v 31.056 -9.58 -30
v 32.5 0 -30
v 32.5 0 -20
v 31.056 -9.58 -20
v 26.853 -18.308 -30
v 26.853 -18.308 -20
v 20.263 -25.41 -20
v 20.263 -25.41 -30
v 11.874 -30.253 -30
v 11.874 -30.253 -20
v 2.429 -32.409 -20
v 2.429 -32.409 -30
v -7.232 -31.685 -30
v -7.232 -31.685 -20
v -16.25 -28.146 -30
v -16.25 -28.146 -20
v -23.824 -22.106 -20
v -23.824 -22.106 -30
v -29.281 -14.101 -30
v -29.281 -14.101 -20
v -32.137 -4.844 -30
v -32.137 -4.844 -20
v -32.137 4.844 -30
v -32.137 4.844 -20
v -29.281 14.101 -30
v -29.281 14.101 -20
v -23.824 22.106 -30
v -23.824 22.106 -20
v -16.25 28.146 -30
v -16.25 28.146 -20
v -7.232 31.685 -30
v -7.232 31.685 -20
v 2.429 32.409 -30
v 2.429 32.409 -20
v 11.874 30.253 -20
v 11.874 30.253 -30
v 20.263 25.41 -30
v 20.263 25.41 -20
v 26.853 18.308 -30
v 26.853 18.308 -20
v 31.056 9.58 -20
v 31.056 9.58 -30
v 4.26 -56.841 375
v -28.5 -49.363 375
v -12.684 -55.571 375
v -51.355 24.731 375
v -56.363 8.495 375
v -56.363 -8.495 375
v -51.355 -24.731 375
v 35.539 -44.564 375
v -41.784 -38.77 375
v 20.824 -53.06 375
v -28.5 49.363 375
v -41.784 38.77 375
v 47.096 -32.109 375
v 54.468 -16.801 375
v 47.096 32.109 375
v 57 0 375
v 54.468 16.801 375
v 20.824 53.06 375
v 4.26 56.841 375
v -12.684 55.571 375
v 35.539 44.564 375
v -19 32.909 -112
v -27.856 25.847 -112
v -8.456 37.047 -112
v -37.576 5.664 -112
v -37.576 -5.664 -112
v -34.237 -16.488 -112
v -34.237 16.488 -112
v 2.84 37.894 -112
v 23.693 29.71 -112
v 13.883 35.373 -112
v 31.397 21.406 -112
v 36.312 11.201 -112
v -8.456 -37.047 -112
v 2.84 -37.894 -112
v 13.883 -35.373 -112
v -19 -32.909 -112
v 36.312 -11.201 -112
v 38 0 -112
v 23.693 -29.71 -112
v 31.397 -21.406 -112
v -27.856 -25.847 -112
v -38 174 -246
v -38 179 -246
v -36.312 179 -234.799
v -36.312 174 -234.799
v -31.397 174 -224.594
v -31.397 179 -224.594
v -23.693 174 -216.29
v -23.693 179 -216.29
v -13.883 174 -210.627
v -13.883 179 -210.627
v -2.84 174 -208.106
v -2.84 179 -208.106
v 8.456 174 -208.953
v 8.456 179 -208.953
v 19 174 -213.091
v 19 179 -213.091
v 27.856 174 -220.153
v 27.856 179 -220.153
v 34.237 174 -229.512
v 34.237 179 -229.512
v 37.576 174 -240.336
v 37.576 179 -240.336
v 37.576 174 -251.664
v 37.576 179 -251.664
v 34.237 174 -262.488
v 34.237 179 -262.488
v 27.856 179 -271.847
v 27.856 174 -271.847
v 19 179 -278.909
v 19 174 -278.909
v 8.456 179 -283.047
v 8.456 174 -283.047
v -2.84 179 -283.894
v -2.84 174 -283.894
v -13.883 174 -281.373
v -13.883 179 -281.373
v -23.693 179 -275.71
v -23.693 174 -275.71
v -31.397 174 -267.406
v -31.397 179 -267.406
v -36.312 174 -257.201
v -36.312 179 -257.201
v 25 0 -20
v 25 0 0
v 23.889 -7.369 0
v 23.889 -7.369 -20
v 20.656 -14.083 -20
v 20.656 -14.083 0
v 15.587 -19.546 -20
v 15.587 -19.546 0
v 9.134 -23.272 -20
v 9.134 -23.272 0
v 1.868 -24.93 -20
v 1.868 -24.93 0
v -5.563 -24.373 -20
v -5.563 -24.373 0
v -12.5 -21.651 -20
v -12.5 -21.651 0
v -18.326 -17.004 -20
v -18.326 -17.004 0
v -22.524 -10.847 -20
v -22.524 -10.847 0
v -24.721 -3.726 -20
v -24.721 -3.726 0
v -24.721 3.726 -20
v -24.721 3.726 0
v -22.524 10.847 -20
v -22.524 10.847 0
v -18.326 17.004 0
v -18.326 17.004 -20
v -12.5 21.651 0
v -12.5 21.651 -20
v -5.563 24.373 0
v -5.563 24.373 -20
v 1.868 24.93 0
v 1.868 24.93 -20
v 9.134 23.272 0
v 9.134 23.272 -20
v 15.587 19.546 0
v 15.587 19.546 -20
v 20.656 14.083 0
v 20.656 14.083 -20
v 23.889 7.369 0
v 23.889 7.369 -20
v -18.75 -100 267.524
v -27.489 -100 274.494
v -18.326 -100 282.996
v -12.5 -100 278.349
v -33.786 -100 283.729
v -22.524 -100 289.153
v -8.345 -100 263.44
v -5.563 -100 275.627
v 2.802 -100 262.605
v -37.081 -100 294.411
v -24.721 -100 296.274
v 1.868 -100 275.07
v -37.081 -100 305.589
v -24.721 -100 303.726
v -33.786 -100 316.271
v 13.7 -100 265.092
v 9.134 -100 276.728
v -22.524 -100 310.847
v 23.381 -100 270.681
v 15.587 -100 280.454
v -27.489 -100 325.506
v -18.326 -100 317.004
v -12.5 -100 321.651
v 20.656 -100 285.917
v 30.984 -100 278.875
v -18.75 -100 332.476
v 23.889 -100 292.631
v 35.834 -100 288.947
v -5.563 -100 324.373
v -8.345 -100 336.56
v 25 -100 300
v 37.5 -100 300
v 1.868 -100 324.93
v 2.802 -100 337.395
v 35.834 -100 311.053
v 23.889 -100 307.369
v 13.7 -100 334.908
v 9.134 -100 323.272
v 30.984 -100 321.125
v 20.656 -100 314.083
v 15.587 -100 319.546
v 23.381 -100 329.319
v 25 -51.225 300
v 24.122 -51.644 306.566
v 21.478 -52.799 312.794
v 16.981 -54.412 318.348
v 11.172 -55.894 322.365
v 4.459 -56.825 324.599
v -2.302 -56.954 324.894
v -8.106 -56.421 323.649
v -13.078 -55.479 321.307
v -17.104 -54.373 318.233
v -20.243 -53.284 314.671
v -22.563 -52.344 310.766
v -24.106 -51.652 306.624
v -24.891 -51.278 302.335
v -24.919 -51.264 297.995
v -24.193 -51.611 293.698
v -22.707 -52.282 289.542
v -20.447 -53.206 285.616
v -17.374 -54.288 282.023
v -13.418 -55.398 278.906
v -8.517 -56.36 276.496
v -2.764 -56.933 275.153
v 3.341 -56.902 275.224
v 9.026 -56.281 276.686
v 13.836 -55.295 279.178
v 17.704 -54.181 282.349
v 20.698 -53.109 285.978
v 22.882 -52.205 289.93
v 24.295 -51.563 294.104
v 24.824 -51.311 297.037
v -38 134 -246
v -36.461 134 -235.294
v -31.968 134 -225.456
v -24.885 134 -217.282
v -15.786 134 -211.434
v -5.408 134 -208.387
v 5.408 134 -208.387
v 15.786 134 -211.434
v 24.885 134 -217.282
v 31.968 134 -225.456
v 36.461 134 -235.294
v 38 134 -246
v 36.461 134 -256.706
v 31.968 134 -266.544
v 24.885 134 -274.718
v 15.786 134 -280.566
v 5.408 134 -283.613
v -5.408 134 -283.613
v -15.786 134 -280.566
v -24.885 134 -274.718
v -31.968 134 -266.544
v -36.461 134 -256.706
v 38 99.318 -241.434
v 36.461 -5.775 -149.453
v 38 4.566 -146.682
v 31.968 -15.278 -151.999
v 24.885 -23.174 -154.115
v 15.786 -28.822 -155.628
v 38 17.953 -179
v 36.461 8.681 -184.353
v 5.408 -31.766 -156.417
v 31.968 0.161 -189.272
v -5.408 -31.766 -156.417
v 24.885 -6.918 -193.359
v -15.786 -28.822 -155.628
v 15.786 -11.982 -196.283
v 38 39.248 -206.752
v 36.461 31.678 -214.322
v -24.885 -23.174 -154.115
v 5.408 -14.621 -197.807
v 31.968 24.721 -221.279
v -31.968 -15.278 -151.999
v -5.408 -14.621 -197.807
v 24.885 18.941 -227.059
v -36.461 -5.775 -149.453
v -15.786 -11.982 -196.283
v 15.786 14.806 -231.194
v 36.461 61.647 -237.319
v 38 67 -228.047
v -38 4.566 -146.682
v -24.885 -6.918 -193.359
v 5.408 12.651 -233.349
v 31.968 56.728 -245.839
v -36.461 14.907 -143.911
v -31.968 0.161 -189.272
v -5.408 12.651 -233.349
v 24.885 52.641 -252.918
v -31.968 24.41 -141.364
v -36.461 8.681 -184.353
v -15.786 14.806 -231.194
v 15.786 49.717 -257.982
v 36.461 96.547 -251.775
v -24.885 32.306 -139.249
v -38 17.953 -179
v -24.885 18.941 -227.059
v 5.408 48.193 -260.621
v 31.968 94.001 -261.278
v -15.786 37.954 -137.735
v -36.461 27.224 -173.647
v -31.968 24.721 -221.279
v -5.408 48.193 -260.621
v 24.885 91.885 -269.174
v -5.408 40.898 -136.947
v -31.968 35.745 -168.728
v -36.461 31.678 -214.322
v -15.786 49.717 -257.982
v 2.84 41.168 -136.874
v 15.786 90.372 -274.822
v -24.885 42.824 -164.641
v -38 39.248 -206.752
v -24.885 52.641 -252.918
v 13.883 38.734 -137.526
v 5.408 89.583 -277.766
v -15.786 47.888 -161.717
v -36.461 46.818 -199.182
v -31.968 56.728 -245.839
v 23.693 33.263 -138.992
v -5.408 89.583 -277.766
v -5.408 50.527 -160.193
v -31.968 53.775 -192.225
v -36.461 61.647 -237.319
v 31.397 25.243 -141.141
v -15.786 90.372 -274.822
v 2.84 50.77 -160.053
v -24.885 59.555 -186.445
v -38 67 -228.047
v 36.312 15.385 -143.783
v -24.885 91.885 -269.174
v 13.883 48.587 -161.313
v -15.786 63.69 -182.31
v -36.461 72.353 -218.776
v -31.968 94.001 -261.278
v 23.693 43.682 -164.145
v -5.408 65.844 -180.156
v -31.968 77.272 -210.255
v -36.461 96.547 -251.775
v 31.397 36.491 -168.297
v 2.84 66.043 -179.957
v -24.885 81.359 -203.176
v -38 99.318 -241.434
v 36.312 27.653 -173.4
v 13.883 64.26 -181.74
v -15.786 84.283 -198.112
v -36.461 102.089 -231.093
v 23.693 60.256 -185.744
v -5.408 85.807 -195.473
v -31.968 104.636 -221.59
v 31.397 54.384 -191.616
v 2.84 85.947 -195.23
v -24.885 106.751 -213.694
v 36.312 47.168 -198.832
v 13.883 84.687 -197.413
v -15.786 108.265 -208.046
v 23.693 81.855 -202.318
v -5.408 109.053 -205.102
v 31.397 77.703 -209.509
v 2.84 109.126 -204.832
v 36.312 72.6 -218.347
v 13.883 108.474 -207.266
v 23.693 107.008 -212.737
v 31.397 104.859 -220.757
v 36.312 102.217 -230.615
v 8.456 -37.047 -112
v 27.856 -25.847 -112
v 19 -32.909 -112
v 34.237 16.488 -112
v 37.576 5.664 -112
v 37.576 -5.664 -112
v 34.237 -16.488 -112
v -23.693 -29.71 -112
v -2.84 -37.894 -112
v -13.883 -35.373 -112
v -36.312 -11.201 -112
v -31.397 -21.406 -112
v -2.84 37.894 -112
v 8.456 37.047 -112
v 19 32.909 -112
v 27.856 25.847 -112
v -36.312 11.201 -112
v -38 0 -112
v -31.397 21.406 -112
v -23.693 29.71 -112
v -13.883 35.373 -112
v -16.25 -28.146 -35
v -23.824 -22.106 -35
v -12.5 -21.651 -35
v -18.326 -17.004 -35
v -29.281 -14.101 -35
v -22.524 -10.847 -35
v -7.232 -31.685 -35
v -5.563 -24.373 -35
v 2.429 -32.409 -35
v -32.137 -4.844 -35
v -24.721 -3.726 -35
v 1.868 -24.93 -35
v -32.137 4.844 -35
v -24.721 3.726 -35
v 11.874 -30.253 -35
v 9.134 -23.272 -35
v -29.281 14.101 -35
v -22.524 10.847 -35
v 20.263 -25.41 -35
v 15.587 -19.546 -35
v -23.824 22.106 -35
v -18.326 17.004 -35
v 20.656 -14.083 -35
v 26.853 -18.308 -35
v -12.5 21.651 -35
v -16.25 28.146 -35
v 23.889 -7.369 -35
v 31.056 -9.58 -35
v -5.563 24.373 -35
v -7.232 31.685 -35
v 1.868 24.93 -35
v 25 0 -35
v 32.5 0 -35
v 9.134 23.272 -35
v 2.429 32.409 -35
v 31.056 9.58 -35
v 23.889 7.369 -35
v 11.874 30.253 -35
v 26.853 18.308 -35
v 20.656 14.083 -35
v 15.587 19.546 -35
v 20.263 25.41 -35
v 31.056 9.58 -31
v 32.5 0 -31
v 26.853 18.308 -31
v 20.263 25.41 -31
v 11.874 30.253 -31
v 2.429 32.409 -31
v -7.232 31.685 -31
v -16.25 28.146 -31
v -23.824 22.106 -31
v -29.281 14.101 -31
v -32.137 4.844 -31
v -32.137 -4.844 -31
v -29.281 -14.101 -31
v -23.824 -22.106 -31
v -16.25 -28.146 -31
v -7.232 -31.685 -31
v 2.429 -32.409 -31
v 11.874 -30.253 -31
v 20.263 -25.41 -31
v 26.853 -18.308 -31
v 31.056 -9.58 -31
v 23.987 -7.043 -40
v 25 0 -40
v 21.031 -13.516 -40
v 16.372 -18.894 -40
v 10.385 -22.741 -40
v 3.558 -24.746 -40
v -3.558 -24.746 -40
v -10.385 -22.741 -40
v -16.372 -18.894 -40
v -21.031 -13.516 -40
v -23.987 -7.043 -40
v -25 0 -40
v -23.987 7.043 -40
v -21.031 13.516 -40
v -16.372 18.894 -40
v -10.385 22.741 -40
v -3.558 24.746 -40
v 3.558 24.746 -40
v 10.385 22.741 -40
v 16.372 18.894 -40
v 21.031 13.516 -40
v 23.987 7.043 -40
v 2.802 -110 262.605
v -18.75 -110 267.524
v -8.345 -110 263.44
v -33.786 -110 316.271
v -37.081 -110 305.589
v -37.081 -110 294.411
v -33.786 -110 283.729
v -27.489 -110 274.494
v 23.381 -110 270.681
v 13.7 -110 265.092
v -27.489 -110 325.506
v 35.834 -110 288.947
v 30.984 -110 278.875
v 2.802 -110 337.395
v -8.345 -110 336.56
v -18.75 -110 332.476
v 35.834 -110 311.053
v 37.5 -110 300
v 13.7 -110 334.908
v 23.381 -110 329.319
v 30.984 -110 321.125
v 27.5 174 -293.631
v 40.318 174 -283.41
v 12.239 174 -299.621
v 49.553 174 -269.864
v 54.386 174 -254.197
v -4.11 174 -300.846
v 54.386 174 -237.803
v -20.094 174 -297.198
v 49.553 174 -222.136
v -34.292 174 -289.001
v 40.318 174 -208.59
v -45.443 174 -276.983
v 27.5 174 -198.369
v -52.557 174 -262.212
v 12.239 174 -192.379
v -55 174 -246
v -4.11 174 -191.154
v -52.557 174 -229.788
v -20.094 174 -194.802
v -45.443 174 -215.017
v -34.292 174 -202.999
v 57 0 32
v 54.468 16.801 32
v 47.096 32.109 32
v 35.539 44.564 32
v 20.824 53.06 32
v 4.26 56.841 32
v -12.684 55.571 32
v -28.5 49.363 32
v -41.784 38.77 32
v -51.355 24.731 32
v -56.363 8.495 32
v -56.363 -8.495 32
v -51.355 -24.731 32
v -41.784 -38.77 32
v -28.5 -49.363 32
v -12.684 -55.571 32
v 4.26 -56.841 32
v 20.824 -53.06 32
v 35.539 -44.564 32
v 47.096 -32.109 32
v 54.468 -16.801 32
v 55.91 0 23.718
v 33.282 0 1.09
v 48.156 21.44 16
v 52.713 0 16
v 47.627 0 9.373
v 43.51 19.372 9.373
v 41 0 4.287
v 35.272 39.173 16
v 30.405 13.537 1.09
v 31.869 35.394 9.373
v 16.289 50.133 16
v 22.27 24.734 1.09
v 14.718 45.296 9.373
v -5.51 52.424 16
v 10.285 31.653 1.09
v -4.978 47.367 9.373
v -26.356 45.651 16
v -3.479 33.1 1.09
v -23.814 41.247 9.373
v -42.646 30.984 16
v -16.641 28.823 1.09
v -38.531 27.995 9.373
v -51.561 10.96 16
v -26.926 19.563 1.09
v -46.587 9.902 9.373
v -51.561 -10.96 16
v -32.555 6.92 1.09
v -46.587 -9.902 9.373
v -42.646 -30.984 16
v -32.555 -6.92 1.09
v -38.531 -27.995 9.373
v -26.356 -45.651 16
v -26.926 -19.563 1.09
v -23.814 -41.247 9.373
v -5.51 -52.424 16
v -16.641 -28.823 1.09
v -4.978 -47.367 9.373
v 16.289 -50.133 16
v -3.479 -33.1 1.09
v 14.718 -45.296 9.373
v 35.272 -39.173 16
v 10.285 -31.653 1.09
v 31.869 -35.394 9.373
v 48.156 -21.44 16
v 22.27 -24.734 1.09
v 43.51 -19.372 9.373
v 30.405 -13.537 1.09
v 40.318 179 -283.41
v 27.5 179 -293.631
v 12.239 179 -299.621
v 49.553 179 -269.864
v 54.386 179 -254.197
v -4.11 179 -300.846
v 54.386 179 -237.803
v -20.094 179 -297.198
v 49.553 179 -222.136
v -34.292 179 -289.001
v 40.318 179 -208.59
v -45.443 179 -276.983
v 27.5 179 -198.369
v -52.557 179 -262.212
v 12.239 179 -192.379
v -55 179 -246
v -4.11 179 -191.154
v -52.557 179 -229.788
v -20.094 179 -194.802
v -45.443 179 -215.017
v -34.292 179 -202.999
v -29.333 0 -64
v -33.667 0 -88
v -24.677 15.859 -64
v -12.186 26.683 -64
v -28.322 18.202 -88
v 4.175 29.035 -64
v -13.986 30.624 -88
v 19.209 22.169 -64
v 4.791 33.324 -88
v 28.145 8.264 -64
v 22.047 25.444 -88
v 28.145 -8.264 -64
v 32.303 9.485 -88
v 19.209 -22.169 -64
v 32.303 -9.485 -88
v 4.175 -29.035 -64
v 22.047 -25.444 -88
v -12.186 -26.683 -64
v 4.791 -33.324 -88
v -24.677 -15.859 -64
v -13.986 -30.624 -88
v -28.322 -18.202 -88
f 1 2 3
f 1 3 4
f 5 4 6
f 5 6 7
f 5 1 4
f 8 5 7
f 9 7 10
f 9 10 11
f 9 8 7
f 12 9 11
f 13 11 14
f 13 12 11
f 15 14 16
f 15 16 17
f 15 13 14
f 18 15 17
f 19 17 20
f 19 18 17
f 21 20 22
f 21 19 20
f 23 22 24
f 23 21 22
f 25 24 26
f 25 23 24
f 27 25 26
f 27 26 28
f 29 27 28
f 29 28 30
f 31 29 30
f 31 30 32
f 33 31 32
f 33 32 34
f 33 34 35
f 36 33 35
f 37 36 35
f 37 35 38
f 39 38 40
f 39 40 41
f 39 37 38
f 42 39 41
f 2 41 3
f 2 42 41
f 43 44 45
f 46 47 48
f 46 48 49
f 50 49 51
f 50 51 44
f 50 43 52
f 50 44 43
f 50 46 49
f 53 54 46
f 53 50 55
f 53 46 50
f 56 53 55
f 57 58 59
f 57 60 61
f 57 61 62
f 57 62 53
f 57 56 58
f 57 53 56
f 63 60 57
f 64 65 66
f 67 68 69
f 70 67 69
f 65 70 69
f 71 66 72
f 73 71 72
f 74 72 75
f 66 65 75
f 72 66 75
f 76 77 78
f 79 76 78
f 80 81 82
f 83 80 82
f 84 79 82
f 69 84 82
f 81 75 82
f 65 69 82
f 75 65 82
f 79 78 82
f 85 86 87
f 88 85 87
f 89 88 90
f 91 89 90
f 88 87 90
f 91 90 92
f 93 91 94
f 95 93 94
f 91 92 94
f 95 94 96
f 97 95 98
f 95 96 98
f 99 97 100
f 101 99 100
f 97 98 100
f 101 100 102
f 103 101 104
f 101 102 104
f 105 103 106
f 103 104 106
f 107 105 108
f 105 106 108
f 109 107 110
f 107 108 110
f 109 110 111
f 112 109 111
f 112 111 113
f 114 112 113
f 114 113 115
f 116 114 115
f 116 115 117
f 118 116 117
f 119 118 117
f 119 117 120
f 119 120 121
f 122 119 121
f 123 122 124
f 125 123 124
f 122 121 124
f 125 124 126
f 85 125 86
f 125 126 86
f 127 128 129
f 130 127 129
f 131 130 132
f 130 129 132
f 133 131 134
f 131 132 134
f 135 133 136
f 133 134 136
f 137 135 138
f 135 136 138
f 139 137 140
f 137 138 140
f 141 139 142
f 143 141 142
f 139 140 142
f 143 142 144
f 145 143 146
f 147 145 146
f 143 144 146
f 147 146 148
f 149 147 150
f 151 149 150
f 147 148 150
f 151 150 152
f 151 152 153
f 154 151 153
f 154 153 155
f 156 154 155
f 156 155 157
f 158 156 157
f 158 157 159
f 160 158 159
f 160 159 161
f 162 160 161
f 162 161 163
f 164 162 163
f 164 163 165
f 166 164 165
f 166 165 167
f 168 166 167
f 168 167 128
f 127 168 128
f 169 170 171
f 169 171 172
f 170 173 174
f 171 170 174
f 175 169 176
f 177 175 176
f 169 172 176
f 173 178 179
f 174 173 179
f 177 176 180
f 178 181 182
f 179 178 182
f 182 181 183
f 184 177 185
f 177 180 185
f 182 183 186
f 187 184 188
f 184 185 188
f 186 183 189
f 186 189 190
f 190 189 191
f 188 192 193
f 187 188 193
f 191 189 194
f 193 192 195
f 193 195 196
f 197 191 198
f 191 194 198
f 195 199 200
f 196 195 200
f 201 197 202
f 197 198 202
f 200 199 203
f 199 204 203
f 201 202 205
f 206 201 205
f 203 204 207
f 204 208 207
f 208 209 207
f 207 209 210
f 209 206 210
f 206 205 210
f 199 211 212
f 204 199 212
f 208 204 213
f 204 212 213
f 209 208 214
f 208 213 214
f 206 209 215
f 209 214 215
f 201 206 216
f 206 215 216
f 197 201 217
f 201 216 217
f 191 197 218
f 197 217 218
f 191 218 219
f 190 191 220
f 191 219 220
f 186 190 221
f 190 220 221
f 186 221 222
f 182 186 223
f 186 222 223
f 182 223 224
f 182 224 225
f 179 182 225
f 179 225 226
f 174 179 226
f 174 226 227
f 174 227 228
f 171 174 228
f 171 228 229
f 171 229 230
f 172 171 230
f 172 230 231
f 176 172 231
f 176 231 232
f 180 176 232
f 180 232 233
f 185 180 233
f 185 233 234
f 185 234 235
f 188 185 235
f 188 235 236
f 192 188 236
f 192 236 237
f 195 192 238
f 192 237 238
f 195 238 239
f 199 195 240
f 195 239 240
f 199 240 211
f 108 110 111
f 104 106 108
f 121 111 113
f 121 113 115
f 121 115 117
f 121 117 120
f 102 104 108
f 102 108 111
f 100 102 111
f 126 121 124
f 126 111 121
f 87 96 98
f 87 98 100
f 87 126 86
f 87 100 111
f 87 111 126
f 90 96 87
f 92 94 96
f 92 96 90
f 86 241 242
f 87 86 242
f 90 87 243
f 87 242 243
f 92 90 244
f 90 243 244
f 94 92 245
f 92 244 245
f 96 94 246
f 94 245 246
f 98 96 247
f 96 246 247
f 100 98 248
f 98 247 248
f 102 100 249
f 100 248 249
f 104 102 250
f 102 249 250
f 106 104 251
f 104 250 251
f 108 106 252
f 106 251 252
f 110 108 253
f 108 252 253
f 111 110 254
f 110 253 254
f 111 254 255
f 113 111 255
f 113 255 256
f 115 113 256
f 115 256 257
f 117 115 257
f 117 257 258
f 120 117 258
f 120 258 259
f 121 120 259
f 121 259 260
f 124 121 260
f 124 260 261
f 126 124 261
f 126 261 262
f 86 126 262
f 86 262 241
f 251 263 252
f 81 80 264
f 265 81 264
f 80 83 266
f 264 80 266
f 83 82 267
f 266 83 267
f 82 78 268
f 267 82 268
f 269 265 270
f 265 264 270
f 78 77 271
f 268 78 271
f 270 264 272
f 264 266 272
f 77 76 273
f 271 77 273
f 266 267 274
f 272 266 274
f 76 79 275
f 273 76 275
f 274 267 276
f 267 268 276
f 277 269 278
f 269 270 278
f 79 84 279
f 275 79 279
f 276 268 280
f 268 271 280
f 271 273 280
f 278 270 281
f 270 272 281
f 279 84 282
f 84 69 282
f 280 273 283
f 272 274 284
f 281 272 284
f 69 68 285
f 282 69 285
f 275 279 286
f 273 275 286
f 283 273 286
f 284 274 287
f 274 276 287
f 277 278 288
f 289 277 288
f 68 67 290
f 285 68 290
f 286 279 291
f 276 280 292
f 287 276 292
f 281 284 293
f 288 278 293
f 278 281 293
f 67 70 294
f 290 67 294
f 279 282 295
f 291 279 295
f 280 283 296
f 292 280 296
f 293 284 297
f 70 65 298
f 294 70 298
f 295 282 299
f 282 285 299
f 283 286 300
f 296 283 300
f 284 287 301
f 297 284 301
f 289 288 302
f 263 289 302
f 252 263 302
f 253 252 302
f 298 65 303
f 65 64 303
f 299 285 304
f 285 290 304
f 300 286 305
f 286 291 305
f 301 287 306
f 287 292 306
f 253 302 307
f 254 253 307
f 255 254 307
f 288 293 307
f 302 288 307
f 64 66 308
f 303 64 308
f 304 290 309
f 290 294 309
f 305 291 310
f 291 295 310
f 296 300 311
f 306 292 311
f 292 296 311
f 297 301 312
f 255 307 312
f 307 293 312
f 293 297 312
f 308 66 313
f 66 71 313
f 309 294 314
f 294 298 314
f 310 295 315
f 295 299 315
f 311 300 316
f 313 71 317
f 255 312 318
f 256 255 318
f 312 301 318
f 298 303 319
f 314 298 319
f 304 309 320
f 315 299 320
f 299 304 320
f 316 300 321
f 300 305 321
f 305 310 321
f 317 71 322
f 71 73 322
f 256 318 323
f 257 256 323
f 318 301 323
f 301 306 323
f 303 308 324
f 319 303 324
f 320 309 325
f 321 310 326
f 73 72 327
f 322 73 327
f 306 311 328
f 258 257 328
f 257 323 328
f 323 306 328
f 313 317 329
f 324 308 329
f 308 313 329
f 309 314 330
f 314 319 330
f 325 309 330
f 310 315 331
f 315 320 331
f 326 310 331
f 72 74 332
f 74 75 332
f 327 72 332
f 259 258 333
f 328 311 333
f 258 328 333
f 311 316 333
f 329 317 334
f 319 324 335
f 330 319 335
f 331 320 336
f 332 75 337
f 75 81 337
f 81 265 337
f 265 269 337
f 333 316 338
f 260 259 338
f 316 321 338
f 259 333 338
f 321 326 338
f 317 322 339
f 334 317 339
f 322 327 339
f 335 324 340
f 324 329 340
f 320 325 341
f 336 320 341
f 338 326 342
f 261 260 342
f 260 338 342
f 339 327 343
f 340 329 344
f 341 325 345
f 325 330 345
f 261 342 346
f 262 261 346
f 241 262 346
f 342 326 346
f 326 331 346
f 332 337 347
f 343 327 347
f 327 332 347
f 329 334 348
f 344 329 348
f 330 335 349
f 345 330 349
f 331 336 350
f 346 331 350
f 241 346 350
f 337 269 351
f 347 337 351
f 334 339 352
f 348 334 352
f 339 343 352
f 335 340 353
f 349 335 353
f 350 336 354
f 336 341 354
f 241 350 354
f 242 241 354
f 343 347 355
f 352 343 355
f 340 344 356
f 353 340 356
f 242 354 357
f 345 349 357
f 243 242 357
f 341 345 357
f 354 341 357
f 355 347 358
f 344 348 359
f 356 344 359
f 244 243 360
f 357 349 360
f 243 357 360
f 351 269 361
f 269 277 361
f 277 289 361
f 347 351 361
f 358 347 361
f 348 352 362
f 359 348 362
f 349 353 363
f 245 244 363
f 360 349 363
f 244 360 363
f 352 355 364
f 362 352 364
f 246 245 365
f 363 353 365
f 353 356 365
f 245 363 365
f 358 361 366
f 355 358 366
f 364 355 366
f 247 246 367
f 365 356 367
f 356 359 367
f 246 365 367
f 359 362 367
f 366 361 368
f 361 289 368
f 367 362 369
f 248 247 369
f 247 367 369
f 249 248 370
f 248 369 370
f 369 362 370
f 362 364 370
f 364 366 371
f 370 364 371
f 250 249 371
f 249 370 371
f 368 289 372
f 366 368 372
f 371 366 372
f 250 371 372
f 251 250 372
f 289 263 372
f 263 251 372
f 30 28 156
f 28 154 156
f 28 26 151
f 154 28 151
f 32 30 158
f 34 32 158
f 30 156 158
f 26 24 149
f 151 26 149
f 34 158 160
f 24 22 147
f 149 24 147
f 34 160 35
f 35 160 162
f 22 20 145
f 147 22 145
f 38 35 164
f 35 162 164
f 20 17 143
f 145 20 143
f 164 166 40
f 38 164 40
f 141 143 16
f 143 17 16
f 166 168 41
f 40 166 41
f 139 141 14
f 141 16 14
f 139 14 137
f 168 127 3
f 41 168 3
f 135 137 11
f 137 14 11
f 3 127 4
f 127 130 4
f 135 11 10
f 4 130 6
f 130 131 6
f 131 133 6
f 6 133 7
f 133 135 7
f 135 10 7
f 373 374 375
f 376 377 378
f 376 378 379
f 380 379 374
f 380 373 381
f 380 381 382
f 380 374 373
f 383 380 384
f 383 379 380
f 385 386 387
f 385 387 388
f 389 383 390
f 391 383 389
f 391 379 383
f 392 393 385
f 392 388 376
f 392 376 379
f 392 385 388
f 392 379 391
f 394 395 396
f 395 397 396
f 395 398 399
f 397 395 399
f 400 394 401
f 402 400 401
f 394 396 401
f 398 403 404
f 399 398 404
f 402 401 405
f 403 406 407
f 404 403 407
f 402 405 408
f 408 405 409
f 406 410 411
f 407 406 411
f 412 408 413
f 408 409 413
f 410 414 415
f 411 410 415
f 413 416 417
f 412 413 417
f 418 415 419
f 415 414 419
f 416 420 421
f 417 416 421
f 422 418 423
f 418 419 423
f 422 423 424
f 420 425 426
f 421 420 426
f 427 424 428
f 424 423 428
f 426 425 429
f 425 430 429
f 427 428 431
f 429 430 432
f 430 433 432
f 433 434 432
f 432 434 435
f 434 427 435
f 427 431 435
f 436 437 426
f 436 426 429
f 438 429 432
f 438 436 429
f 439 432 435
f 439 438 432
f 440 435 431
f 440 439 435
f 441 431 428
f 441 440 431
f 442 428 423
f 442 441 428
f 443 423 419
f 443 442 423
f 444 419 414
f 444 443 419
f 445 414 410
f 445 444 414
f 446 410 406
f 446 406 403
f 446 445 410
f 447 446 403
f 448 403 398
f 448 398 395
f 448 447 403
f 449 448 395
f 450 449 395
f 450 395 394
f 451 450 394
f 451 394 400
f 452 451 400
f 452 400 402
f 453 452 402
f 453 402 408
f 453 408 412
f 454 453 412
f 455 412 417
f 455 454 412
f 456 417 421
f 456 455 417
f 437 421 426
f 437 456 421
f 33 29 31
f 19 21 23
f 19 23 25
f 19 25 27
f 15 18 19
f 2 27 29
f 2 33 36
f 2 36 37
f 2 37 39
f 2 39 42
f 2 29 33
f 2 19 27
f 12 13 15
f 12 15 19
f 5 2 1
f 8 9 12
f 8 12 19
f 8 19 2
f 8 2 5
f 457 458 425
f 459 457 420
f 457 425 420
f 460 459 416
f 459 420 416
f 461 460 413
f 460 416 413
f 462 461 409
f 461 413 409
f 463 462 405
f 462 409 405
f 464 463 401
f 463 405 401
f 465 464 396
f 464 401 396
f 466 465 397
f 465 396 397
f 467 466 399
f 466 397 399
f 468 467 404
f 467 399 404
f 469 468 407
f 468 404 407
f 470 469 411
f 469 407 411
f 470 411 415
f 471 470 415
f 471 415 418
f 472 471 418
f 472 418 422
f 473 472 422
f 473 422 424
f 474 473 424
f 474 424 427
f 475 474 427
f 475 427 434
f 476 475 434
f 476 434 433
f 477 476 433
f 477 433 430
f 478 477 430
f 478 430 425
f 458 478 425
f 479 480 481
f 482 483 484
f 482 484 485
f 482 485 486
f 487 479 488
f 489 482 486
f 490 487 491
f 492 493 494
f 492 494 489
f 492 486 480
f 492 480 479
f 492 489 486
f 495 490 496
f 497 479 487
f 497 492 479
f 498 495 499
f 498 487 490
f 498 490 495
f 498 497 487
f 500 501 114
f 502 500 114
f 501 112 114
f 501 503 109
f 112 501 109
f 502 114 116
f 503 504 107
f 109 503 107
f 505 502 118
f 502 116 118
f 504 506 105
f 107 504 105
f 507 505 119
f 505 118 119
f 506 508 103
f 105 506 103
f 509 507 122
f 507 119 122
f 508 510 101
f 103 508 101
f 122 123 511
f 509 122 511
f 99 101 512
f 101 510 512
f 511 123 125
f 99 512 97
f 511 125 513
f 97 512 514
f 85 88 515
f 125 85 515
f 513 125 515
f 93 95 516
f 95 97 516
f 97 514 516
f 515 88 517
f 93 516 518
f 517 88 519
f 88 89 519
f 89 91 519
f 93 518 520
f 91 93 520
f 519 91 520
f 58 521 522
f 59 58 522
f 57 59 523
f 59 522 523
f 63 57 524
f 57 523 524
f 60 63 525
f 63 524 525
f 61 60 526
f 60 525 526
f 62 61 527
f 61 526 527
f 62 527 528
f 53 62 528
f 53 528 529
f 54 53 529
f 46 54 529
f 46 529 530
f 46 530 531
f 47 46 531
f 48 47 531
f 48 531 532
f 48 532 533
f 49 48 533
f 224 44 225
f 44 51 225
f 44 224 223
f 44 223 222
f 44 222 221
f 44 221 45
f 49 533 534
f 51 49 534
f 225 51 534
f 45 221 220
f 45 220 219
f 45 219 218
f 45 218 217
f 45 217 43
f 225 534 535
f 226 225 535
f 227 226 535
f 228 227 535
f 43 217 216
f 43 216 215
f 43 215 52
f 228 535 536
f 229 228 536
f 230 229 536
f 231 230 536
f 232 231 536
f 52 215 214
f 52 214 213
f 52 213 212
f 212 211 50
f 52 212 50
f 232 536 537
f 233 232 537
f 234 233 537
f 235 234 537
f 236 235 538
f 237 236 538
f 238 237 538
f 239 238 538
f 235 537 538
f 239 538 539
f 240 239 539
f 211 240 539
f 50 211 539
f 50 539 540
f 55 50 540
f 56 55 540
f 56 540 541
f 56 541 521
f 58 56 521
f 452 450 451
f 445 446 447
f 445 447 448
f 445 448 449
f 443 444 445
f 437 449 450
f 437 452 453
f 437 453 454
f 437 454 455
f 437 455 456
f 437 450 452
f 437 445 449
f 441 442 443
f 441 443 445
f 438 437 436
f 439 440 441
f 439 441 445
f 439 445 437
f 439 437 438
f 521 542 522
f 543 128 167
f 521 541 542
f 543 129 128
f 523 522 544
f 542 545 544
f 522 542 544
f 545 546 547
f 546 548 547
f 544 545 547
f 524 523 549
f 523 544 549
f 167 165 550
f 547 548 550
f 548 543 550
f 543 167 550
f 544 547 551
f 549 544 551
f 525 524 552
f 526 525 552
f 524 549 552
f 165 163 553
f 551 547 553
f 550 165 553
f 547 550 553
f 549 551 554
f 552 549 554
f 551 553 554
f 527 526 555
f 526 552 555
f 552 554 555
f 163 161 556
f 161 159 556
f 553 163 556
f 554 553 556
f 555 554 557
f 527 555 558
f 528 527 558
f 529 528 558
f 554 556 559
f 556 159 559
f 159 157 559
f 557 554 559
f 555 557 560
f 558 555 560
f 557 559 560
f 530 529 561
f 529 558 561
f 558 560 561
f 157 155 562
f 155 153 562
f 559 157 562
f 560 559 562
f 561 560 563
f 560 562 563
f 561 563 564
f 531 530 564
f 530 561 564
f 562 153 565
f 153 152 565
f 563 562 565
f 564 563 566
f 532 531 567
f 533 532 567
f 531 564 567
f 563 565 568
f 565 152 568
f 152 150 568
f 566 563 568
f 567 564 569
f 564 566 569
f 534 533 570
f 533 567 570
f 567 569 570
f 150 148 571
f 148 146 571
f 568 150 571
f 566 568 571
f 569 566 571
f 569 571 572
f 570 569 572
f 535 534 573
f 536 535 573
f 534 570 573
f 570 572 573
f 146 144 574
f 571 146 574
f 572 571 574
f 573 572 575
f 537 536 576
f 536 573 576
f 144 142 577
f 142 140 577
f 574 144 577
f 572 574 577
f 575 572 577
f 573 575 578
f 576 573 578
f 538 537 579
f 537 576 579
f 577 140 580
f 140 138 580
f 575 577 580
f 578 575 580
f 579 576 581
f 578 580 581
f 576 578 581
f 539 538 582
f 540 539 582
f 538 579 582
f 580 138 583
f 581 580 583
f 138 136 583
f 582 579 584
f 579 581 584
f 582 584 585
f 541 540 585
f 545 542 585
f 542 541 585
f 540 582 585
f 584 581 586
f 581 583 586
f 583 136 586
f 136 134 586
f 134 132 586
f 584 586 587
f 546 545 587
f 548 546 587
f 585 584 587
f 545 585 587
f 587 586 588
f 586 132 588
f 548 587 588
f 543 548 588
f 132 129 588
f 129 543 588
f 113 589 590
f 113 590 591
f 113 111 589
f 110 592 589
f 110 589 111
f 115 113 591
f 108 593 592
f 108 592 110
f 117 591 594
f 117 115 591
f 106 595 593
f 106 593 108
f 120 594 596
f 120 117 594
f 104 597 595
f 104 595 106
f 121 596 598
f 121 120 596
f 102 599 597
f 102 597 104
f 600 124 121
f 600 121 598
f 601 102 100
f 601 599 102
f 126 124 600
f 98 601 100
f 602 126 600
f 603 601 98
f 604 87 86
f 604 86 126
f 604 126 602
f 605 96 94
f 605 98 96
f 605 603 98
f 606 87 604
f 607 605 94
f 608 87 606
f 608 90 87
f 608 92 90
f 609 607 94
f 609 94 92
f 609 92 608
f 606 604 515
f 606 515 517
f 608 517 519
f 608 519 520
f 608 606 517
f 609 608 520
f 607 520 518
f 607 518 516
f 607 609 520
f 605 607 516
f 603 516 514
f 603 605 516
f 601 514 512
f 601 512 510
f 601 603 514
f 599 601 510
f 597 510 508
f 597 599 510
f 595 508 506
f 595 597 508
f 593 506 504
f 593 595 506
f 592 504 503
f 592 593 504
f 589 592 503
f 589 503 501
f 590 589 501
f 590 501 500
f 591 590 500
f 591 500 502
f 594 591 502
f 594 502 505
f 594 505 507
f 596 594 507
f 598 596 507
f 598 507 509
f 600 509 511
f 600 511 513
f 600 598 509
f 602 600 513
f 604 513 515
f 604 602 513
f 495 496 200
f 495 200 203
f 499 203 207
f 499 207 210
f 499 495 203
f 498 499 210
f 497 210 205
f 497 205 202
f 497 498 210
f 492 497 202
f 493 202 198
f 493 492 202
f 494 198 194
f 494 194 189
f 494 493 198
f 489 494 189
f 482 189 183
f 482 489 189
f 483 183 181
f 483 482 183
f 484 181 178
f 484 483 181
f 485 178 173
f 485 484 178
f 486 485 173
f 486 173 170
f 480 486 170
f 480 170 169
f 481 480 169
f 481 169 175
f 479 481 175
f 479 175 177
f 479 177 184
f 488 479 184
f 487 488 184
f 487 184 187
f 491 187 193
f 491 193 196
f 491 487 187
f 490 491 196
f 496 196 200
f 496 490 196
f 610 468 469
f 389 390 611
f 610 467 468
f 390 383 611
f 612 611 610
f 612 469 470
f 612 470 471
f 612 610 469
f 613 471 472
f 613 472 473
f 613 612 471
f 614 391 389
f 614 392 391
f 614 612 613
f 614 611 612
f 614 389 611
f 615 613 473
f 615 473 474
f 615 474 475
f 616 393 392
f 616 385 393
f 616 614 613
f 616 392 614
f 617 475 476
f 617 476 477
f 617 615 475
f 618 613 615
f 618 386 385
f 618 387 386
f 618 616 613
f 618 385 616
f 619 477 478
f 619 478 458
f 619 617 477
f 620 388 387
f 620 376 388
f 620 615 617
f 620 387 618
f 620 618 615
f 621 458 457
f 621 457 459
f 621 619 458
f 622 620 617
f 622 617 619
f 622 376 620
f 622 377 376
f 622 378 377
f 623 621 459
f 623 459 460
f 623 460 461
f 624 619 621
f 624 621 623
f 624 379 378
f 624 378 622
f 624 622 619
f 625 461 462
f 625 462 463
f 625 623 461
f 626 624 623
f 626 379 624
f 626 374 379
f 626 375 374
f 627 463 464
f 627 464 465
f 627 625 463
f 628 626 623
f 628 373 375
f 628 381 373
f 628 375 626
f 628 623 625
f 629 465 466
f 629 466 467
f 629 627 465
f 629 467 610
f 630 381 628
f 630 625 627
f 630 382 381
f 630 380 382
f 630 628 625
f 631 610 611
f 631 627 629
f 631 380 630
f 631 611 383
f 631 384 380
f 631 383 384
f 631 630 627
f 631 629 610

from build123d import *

# Parameters (mm, degrees)
F0_R      = 57
F1_DEPTH  = 375
F2_R      = 32
F3_R      = 25
F4_DEPTH  = 110
F5_R      = 37.5
F5_R_2    = 25
F6_DEPTH  = 10
F7_R      = 25
F8_DEPTH  = 30
F9_R      = 32.5
F9_R_2    = 25
F10_DEPTH = 10
F12_R     = 25
F13_DEPTH = 9
F14_R     = 32.5
F14_R_2   = 25
F15_DEPTH = 4
F18_R     = 38
F19_ANGLE = 90
F20_R     = 38
F21_DEPTH = 45
F22_R     = 55
F22_R_2   = 38
F23_DEPTH = 5


with BuildPart() as f1:
    # F0 (on Top) → F1 (new body)
    with BuildSketch(Plane.XY):
        Circle(F0_R)
    extrude(amount=F1_DEPTH)

    # F2
    f2_edges = [f1.edges().sort_by_distance(p)[0] for p in [
        (-57, 0, 0),
    ]]
    fillet(f2_edges, radius=F2_R)

    # F3 (on Front) → F4 (join)
    with BuildSketch(Plane.XZ):
        with Locations((0, 300)):
            Circle(F3_R)
    extrude(amount=F4_DEPTH)

    # F5 (on face) → F6 (join)
    with BuildSketch(Plane.XZ.offset(110)):
        with Locations((0, 300)):
            Circle(F5_R)
        with Locations((0, 300)):
            Circle(F5_R_2, mode=Mode.SUBTRACT)
    extrude(amount=-F6_DEPTH)

    # F7 (on face) → F8 (join)
    with BuildSketch(Plane(origin=(0, 0, 0), x_dir=(1, 0, 0), z_dir=(0, 0, -1))):
        Circle(F7_R)
    extrude(amount=F8_DEPTH)

    # F9 (on face) → F10 (join)
    with BuildSketch(Plane(origin=(0, 0, -30), x_dir=(1, 0, 0), z_dir=(0, 0, -1))):
        Circle(F9_R)
        Circle(F9_R_2, mode=Mode.SUBTRACT)
    extrude(amount=-F10_DEPTH)


with BuildPart() as f13:
    # F12 (on offset) → F13 (new body)
    with BuildSketch(Plane(origin=(0, 0, -31), x_dir=(1, 0, 0), z_dir=(0, 0, -1))):
        Circle(F12_R)
    extrude(amount=F13_DEPTH)

    # F14 (on face) → F15 (join)
    with BuildSketch(Plane.XY.offset(-31)):
        Circle(F14_R)
        Circle(F14_R_2, mode=Mode.SUBTRACT)
    extrude(amount=-F15_DEPTH)

    # F16 (on Front) → F17 (revolve)
    with BuildSketch(Plane.XZ):
        Polygon((0, -112), (0, -40), (-25, -40), (-38, -112), align=None)
    revolve(axis=Axis((0, 0, -76), (0, 0, -1)))


with BuildPart() as f19:
    # F18 (on face) → F19 (revolve)
    with BuildSketch(Plane(origin=(0, 0, -112), x_dir=(1, 0, 0), z_dir=(0, 0, -1))):
        Circle(F18_R)
    revolve(axis=Axis((-15.2300149202, 134, -112), (1, 0, 0)), revolution_arc=F19_ANGLE)

    # F20 (on face) → F21 (join)
    with BuildSketch(Plane(origin=(0, 134, 0), x_dir=(-1, 0, 0), z_dir=(0, 1, 0))):
        with Locations((0, -246)):
            Circle(F20_R)
    extrude(amount=F21_DEPTH)


with BuildPart() as f23:
    # F22 (on face) → F23 (new body)
    with BuildSketch(Plane(origin=(0, 179, 0), x_dir=(-1, 0, 0), z_dir=(0, 1, 0))):
        with Locations((0, -246)):
            Circle(F22_R)
        with Locations((0, -246)):
            Circle(F22_R_2, mode=Mode.SUBTRACT)
    extrude(amount=-F23_DEPTH)


solid = Compound([f1.part, f13.part, f19.part, f23.part])
